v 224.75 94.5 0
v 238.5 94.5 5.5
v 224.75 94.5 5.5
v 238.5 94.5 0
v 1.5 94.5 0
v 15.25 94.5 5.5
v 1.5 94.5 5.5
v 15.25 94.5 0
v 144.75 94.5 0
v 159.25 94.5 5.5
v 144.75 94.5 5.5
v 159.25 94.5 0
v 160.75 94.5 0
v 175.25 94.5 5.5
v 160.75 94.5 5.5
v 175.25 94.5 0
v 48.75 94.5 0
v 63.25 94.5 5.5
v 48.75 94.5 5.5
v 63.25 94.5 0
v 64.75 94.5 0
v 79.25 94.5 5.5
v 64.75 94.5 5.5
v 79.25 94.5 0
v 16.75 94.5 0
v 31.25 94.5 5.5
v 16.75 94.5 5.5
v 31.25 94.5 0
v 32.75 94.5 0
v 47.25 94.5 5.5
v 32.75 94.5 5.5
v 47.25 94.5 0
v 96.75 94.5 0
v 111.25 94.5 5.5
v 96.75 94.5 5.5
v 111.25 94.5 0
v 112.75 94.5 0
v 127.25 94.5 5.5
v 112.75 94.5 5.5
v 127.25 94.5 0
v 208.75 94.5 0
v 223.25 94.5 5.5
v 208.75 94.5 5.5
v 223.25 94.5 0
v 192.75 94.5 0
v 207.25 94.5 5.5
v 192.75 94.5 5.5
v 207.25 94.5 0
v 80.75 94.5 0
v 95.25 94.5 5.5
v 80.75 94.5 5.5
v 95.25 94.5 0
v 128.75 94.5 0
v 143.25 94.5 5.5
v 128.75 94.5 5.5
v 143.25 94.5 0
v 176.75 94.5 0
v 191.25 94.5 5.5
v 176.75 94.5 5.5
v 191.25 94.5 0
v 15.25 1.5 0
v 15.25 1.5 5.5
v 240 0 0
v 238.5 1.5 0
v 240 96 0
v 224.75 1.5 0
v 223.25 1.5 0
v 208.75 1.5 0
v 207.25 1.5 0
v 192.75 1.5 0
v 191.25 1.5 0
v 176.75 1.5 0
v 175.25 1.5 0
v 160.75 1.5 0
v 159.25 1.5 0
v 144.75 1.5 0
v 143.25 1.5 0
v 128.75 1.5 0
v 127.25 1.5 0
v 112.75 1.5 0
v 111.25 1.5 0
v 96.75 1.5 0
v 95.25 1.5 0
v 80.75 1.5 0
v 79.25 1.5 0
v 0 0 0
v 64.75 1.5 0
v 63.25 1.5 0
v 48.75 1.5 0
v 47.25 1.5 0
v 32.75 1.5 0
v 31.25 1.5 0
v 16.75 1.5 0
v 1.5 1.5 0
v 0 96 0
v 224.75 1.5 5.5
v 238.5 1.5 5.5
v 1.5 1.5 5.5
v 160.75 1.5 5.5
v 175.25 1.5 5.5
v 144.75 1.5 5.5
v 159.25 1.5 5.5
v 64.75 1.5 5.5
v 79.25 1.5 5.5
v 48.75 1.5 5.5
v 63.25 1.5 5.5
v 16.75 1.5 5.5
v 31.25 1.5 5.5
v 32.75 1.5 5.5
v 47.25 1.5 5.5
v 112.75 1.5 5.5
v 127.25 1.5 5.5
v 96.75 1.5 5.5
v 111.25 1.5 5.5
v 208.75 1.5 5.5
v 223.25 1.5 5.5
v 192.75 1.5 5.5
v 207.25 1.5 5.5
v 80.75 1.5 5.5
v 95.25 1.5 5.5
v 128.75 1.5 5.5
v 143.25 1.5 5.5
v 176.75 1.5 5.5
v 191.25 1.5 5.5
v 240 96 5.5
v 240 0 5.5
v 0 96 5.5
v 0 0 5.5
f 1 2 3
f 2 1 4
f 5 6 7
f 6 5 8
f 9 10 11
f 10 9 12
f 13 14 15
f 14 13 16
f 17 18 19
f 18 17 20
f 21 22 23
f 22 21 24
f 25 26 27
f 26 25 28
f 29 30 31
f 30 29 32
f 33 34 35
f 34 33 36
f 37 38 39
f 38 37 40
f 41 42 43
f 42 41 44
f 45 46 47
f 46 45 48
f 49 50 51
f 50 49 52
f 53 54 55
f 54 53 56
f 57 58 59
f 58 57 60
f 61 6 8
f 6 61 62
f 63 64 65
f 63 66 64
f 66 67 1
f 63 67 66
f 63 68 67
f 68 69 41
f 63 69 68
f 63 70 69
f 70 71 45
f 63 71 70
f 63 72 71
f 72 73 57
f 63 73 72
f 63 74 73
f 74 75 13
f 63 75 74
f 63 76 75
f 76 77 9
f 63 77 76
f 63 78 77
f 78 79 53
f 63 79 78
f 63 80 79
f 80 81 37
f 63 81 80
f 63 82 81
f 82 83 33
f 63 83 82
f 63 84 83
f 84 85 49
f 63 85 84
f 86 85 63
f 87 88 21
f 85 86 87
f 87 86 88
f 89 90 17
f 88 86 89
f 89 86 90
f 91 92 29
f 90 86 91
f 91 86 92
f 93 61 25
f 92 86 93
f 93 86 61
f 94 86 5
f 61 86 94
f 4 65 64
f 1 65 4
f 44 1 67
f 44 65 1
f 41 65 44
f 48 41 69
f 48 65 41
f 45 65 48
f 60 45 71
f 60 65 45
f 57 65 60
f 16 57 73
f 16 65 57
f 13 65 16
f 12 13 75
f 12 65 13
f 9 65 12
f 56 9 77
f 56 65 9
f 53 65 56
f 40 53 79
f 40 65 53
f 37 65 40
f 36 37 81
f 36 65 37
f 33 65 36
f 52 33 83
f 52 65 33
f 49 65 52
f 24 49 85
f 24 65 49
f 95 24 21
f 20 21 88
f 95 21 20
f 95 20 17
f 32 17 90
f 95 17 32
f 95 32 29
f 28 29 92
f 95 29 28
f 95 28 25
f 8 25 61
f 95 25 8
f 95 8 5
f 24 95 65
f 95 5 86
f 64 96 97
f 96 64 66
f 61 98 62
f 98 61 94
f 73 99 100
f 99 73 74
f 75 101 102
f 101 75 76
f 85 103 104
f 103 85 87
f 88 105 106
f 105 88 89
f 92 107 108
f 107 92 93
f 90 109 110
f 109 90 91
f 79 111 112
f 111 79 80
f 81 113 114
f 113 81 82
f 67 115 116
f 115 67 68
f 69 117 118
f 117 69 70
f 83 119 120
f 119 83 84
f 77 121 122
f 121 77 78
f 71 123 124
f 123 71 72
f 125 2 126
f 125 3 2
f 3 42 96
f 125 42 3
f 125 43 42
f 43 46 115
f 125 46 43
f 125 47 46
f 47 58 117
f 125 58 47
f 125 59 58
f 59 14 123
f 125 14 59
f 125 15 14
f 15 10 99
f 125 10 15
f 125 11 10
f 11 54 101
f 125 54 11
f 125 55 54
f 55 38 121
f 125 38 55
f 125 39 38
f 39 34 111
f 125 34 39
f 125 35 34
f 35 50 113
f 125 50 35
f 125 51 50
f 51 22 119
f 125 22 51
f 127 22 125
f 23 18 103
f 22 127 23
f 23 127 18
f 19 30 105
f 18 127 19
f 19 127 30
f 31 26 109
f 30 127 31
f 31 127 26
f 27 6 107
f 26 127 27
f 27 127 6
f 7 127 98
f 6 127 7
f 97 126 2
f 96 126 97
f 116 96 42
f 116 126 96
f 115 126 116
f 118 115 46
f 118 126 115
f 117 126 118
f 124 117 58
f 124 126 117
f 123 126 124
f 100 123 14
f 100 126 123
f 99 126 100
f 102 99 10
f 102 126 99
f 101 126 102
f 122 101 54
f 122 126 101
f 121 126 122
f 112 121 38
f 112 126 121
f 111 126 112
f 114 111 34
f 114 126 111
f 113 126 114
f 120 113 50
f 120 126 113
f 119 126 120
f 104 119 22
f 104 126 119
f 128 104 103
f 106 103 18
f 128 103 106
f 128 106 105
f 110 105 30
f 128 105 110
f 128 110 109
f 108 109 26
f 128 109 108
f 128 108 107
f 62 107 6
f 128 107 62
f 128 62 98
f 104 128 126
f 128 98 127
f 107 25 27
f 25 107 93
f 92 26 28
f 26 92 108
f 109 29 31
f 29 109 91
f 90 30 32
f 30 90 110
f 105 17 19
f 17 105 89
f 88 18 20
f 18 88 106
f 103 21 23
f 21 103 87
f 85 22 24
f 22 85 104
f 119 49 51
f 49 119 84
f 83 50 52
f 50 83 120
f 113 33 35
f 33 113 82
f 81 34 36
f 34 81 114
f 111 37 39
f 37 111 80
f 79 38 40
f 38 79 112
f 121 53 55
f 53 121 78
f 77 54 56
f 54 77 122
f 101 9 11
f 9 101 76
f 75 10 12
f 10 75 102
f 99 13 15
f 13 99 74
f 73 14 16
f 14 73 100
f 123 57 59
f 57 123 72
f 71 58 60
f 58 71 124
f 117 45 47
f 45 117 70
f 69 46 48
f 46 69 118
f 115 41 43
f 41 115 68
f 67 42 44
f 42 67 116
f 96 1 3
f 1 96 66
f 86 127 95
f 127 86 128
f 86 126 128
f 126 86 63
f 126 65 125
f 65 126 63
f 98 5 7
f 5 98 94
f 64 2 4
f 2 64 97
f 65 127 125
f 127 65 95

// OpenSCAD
// file: lumber.scad
use <utilities.scad>;

// Stick
module 2x4x8(cut=[0, 0, 0]) {
    echo("2x4x8");
    cube([inches(1, 1/2) - cut[0], inches(3, 1/2) - cut[1], feet(8) - cut[2]]);
};

module 2x6x8(cut=[0, 0, 0]) {
    echo("2x6x8");
    cube([inches(1, 1/2) - cut[0], inches(5, 1/2) - cut[1], feet(8) - cut[2]]);
};

// Sheet
module 4x8x34ths(cut=[0, 0, 0]) {
    echo("4x8x3/4");
    cube([feet(4) - cut[0], feet(8) - cut[1], inches(0, 3/4) - cut[2]]);
};

2x4x8();

translate([24, 0, 0])
    2x6x8();

translate([48, 0, 0])
    4x8x34ths();
// file: utilities.scad
function feet(f) = f * 12;
function inches(i=0, f=0) = i+f; 
// main file
use <utilities.scad>;
use <lumber.scad>;

module frame_floor() {
    // South Rim Joists
    rotate(a=[0,90,0])
        rotate(a=90, v=[0,0,1])
            2x6x8();
                    
    rotate(a=[0,90,0])
        rotate(a=90, v=[0,0,1])
            translate([0, 0, feet(8)])
                2x6x8();
                
    rotate(a=[0,90,0])
        rotate(a=90, v=[0,0,1])
            translate([0, 0, feet(16)])
                2x6x8(cut=[0, 0, feet(4)]);
                
    // floor joists
    translate([0,1.5,5.5])
            rotate(a=[270,0,00])
               2x6x8(cut=[0, 0, inches(3)]);

    for (x = [15.25:16:239]) {
        translate([x, inches(1, 1/2), inches(5, 1/2)])
            rotate(a=[270,0,00])
                2x6x8(cut=[0, 0, inches(3)]);
    }

    translate([238.5,1.5,5.5])
            rotate(a=[270,0,00])
                2x6x8(cut=[0, 0, inches(3)]);

    // North Rim Joists
    translate([0, feet(7) + inches(10, 1/2), 0])
        rotate(a=[0,90,0])
            rotate(a=90, v=[0,0,1])
                2x6x8();

    translate([feet(8), feet(7) + inches(10, 1/2), 0])
        rotate(a=[0,90,0])
            rotate(a=90, v=[0,0,1])
                2x6x8();

    translate([feet(16), feet(7) + inches(10, 1/2), 0])
        rotate(a=[0,90,0])
            rotate(a=90, v=[0,0,1])
                2x6x8(cut=[0, 0, feet(4)]);
}

frame_floor();
